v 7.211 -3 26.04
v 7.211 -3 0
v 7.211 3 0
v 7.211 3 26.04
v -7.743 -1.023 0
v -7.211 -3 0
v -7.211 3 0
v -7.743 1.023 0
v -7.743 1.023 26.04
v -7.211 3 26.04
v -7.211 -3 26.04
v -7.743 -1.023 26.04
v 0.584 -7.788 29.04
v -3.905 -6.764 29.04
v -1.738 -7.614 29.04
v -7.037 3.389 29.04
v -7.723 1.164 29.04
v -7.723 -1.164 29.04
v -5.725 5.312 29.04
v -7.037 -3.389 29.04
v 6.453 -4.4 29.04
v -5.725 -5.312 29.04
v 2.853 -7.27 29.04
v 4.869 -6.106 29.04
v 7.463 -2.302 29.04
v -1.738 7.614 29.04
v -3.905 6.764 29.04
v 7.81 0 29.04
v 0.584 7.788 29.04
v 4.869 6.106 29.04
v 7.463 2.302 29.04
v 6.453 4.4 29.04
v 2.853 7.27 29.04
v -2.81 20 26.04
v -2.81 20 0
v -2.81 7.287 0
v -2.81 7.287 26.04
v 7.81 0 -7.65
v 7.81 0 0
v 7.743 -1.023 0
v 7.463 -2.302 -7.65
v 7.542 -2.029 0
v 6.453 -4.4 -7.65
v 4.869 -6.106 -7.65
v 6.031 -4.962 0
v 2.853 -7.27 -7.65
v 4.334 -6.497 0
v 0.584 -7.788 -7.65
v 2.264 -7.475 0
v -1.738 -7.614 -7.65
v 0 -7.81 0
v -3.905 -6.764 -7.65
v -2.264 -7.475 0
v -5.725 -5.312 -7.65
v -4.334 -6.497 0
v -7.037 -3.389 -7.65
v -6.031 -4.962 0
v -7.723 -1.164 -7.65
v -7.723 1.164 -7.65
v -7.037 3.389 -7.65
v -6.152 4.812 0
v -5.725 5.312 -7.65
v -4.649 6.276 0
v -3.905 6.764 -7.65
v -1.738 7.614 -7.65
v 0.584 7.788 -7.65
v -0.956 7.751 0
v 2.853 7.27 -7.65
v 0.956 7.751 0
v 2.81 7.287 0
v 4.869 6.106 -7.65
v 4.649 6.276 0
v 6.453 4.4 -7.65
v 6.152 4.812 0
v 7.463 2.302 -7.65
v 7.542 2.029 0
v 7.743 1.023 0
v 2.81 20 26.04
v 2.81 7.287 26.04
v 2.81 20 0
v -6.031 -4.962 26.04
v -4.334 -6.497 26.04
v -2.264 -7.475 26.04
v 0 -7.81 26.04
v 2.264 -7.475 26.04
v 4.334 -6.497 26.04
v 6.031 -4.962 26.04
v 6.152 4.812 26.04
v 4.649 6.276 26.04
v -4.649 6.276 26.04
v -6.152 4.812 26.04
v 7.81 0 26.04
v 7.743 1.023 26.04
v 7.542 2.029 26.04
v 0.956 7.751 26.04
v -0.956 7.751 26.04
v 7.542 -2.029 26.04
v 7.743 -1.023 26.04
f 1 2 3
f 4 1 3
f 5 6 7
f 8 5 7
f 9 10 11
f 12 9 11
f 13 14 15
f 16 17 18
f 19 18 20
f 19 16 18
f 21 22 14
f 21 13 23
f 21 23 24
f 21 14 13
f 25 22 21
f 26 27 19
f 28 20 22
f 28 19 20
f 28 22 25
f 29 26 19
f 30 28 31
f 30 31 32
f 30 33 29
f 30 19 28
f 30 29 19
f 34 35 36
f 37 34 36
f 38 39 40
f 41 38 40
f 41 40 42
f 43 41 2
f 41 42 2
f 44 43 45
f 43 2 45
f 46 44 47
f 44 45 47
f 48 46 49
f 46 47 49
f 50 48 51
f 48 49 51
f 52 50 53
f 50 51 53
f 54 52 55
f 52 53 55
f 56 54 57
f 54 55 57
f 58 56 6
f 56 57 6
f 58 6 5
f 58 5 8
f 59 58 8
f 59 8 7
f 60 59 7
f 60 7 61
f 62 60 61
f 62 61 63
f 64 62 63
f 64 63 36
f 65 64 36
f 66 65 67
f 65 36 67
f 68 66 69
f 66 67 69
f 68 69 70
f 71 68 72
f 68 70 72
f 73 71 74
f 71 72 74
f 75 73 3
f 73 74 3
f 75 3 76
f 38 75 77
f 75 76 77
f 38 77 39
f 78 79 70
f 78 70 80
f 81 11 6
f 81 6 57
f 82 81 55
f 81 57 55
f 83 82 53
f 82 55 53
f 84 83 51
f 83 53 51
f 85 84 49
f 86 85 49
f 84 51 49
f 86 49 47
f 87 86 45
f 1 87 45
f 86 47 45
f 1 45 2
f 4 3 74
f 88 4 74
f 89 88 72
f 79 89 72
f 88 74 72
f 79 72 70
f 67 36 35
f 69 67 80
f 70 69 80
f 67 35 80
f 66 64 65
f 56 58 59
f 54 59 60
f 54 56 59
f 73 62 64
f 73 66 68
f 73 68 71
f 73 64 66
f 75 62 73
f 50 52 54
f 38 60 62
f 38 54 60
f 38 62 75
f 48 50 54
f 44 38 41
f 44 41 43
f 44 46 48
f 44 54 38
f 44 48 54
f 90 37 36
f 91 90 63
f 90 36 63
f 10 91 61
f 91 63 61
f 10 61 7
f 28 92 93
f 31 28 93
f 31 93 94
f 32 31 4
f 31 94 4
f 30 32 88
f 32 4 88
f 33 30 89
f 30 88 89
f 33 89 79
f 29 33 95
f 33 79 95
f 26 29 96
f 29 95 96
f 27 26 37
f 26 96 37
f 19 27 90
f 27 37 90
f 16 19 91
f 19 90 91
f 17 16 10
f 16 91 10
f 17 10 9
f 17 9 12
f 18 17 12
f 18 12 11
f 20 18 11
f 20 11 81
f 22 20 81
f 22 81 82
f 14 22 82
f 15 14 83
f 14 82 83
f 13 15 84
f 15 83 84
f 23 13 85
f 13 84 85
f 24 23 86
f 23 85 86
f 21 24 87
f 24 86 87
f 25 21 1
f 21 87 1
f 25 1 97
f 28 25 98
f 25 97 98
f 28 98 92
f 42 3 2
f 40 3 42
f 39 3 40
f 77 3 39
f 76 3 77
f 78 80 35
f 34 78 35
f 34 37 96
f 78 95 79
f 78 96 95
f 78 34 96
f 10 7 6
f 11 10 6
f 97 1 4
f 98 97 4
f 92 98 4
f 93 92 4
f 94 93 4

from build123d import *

# Parameters (mm, degrees)
F1_DEPTH = 26.04
F2_R     = 7.81
F3_DEPTH = 3
F4_R     = 7.81
F5_DEPTH = 7.65


with BuildPart() as f1:
    # F0 (on Top) → F1 (new body)
    with BuildSketch(Plane.XY):
        with BuildLine():
            Line((-2.81, 20), (-2.81, 7.286975))
            ThreePointArc((-2.81, 7.286975), (-5.449661, 5.594398), (-7.210832, 3))
            Line((-7.210832, 3), (-7.210832, 0))
            Line((-7.210832, 0), (7.210832, 0))
            Line((7.210832, 0), (7.210832, 3))
            ThreePointArc((7.210832, 3), (5.449661, 5.594398), (2.81, 7.286975))
            Line((2.81, 7.286975), (2.81, 20))
            Line((2.81, 20), (-2.81, 20))
        make_face()
        with BuildLine():
            Line((7.210832, 0), (-7.210832, 0))
            Line((-7.210832, 0), (-7.210832, -3))
            ThreePointArc((-7.210832, -3), (0, -7.81), (7.210832, -3))
            Line((7.210832, -3), (7.210832, 0))
        make_face()
    extrude(amount=F1_DEPTH)

    # F2 (on face) → F3 (join)
    with BuildSketch(Plane.XY.offset(26.04)):
        Circle(F2_R)
    extrude(amount=F3_DEPTH)

    # F4 (on face) → F5 (join)
    with BuildSketch(Plane(origin=(0, 0, 0), x_dir=(1, 0, 0), z_dir=(0, 0, -1))):
        Circle(F4_R)
    extrude(amount=F5_DEPTH)


solid = f1.part
